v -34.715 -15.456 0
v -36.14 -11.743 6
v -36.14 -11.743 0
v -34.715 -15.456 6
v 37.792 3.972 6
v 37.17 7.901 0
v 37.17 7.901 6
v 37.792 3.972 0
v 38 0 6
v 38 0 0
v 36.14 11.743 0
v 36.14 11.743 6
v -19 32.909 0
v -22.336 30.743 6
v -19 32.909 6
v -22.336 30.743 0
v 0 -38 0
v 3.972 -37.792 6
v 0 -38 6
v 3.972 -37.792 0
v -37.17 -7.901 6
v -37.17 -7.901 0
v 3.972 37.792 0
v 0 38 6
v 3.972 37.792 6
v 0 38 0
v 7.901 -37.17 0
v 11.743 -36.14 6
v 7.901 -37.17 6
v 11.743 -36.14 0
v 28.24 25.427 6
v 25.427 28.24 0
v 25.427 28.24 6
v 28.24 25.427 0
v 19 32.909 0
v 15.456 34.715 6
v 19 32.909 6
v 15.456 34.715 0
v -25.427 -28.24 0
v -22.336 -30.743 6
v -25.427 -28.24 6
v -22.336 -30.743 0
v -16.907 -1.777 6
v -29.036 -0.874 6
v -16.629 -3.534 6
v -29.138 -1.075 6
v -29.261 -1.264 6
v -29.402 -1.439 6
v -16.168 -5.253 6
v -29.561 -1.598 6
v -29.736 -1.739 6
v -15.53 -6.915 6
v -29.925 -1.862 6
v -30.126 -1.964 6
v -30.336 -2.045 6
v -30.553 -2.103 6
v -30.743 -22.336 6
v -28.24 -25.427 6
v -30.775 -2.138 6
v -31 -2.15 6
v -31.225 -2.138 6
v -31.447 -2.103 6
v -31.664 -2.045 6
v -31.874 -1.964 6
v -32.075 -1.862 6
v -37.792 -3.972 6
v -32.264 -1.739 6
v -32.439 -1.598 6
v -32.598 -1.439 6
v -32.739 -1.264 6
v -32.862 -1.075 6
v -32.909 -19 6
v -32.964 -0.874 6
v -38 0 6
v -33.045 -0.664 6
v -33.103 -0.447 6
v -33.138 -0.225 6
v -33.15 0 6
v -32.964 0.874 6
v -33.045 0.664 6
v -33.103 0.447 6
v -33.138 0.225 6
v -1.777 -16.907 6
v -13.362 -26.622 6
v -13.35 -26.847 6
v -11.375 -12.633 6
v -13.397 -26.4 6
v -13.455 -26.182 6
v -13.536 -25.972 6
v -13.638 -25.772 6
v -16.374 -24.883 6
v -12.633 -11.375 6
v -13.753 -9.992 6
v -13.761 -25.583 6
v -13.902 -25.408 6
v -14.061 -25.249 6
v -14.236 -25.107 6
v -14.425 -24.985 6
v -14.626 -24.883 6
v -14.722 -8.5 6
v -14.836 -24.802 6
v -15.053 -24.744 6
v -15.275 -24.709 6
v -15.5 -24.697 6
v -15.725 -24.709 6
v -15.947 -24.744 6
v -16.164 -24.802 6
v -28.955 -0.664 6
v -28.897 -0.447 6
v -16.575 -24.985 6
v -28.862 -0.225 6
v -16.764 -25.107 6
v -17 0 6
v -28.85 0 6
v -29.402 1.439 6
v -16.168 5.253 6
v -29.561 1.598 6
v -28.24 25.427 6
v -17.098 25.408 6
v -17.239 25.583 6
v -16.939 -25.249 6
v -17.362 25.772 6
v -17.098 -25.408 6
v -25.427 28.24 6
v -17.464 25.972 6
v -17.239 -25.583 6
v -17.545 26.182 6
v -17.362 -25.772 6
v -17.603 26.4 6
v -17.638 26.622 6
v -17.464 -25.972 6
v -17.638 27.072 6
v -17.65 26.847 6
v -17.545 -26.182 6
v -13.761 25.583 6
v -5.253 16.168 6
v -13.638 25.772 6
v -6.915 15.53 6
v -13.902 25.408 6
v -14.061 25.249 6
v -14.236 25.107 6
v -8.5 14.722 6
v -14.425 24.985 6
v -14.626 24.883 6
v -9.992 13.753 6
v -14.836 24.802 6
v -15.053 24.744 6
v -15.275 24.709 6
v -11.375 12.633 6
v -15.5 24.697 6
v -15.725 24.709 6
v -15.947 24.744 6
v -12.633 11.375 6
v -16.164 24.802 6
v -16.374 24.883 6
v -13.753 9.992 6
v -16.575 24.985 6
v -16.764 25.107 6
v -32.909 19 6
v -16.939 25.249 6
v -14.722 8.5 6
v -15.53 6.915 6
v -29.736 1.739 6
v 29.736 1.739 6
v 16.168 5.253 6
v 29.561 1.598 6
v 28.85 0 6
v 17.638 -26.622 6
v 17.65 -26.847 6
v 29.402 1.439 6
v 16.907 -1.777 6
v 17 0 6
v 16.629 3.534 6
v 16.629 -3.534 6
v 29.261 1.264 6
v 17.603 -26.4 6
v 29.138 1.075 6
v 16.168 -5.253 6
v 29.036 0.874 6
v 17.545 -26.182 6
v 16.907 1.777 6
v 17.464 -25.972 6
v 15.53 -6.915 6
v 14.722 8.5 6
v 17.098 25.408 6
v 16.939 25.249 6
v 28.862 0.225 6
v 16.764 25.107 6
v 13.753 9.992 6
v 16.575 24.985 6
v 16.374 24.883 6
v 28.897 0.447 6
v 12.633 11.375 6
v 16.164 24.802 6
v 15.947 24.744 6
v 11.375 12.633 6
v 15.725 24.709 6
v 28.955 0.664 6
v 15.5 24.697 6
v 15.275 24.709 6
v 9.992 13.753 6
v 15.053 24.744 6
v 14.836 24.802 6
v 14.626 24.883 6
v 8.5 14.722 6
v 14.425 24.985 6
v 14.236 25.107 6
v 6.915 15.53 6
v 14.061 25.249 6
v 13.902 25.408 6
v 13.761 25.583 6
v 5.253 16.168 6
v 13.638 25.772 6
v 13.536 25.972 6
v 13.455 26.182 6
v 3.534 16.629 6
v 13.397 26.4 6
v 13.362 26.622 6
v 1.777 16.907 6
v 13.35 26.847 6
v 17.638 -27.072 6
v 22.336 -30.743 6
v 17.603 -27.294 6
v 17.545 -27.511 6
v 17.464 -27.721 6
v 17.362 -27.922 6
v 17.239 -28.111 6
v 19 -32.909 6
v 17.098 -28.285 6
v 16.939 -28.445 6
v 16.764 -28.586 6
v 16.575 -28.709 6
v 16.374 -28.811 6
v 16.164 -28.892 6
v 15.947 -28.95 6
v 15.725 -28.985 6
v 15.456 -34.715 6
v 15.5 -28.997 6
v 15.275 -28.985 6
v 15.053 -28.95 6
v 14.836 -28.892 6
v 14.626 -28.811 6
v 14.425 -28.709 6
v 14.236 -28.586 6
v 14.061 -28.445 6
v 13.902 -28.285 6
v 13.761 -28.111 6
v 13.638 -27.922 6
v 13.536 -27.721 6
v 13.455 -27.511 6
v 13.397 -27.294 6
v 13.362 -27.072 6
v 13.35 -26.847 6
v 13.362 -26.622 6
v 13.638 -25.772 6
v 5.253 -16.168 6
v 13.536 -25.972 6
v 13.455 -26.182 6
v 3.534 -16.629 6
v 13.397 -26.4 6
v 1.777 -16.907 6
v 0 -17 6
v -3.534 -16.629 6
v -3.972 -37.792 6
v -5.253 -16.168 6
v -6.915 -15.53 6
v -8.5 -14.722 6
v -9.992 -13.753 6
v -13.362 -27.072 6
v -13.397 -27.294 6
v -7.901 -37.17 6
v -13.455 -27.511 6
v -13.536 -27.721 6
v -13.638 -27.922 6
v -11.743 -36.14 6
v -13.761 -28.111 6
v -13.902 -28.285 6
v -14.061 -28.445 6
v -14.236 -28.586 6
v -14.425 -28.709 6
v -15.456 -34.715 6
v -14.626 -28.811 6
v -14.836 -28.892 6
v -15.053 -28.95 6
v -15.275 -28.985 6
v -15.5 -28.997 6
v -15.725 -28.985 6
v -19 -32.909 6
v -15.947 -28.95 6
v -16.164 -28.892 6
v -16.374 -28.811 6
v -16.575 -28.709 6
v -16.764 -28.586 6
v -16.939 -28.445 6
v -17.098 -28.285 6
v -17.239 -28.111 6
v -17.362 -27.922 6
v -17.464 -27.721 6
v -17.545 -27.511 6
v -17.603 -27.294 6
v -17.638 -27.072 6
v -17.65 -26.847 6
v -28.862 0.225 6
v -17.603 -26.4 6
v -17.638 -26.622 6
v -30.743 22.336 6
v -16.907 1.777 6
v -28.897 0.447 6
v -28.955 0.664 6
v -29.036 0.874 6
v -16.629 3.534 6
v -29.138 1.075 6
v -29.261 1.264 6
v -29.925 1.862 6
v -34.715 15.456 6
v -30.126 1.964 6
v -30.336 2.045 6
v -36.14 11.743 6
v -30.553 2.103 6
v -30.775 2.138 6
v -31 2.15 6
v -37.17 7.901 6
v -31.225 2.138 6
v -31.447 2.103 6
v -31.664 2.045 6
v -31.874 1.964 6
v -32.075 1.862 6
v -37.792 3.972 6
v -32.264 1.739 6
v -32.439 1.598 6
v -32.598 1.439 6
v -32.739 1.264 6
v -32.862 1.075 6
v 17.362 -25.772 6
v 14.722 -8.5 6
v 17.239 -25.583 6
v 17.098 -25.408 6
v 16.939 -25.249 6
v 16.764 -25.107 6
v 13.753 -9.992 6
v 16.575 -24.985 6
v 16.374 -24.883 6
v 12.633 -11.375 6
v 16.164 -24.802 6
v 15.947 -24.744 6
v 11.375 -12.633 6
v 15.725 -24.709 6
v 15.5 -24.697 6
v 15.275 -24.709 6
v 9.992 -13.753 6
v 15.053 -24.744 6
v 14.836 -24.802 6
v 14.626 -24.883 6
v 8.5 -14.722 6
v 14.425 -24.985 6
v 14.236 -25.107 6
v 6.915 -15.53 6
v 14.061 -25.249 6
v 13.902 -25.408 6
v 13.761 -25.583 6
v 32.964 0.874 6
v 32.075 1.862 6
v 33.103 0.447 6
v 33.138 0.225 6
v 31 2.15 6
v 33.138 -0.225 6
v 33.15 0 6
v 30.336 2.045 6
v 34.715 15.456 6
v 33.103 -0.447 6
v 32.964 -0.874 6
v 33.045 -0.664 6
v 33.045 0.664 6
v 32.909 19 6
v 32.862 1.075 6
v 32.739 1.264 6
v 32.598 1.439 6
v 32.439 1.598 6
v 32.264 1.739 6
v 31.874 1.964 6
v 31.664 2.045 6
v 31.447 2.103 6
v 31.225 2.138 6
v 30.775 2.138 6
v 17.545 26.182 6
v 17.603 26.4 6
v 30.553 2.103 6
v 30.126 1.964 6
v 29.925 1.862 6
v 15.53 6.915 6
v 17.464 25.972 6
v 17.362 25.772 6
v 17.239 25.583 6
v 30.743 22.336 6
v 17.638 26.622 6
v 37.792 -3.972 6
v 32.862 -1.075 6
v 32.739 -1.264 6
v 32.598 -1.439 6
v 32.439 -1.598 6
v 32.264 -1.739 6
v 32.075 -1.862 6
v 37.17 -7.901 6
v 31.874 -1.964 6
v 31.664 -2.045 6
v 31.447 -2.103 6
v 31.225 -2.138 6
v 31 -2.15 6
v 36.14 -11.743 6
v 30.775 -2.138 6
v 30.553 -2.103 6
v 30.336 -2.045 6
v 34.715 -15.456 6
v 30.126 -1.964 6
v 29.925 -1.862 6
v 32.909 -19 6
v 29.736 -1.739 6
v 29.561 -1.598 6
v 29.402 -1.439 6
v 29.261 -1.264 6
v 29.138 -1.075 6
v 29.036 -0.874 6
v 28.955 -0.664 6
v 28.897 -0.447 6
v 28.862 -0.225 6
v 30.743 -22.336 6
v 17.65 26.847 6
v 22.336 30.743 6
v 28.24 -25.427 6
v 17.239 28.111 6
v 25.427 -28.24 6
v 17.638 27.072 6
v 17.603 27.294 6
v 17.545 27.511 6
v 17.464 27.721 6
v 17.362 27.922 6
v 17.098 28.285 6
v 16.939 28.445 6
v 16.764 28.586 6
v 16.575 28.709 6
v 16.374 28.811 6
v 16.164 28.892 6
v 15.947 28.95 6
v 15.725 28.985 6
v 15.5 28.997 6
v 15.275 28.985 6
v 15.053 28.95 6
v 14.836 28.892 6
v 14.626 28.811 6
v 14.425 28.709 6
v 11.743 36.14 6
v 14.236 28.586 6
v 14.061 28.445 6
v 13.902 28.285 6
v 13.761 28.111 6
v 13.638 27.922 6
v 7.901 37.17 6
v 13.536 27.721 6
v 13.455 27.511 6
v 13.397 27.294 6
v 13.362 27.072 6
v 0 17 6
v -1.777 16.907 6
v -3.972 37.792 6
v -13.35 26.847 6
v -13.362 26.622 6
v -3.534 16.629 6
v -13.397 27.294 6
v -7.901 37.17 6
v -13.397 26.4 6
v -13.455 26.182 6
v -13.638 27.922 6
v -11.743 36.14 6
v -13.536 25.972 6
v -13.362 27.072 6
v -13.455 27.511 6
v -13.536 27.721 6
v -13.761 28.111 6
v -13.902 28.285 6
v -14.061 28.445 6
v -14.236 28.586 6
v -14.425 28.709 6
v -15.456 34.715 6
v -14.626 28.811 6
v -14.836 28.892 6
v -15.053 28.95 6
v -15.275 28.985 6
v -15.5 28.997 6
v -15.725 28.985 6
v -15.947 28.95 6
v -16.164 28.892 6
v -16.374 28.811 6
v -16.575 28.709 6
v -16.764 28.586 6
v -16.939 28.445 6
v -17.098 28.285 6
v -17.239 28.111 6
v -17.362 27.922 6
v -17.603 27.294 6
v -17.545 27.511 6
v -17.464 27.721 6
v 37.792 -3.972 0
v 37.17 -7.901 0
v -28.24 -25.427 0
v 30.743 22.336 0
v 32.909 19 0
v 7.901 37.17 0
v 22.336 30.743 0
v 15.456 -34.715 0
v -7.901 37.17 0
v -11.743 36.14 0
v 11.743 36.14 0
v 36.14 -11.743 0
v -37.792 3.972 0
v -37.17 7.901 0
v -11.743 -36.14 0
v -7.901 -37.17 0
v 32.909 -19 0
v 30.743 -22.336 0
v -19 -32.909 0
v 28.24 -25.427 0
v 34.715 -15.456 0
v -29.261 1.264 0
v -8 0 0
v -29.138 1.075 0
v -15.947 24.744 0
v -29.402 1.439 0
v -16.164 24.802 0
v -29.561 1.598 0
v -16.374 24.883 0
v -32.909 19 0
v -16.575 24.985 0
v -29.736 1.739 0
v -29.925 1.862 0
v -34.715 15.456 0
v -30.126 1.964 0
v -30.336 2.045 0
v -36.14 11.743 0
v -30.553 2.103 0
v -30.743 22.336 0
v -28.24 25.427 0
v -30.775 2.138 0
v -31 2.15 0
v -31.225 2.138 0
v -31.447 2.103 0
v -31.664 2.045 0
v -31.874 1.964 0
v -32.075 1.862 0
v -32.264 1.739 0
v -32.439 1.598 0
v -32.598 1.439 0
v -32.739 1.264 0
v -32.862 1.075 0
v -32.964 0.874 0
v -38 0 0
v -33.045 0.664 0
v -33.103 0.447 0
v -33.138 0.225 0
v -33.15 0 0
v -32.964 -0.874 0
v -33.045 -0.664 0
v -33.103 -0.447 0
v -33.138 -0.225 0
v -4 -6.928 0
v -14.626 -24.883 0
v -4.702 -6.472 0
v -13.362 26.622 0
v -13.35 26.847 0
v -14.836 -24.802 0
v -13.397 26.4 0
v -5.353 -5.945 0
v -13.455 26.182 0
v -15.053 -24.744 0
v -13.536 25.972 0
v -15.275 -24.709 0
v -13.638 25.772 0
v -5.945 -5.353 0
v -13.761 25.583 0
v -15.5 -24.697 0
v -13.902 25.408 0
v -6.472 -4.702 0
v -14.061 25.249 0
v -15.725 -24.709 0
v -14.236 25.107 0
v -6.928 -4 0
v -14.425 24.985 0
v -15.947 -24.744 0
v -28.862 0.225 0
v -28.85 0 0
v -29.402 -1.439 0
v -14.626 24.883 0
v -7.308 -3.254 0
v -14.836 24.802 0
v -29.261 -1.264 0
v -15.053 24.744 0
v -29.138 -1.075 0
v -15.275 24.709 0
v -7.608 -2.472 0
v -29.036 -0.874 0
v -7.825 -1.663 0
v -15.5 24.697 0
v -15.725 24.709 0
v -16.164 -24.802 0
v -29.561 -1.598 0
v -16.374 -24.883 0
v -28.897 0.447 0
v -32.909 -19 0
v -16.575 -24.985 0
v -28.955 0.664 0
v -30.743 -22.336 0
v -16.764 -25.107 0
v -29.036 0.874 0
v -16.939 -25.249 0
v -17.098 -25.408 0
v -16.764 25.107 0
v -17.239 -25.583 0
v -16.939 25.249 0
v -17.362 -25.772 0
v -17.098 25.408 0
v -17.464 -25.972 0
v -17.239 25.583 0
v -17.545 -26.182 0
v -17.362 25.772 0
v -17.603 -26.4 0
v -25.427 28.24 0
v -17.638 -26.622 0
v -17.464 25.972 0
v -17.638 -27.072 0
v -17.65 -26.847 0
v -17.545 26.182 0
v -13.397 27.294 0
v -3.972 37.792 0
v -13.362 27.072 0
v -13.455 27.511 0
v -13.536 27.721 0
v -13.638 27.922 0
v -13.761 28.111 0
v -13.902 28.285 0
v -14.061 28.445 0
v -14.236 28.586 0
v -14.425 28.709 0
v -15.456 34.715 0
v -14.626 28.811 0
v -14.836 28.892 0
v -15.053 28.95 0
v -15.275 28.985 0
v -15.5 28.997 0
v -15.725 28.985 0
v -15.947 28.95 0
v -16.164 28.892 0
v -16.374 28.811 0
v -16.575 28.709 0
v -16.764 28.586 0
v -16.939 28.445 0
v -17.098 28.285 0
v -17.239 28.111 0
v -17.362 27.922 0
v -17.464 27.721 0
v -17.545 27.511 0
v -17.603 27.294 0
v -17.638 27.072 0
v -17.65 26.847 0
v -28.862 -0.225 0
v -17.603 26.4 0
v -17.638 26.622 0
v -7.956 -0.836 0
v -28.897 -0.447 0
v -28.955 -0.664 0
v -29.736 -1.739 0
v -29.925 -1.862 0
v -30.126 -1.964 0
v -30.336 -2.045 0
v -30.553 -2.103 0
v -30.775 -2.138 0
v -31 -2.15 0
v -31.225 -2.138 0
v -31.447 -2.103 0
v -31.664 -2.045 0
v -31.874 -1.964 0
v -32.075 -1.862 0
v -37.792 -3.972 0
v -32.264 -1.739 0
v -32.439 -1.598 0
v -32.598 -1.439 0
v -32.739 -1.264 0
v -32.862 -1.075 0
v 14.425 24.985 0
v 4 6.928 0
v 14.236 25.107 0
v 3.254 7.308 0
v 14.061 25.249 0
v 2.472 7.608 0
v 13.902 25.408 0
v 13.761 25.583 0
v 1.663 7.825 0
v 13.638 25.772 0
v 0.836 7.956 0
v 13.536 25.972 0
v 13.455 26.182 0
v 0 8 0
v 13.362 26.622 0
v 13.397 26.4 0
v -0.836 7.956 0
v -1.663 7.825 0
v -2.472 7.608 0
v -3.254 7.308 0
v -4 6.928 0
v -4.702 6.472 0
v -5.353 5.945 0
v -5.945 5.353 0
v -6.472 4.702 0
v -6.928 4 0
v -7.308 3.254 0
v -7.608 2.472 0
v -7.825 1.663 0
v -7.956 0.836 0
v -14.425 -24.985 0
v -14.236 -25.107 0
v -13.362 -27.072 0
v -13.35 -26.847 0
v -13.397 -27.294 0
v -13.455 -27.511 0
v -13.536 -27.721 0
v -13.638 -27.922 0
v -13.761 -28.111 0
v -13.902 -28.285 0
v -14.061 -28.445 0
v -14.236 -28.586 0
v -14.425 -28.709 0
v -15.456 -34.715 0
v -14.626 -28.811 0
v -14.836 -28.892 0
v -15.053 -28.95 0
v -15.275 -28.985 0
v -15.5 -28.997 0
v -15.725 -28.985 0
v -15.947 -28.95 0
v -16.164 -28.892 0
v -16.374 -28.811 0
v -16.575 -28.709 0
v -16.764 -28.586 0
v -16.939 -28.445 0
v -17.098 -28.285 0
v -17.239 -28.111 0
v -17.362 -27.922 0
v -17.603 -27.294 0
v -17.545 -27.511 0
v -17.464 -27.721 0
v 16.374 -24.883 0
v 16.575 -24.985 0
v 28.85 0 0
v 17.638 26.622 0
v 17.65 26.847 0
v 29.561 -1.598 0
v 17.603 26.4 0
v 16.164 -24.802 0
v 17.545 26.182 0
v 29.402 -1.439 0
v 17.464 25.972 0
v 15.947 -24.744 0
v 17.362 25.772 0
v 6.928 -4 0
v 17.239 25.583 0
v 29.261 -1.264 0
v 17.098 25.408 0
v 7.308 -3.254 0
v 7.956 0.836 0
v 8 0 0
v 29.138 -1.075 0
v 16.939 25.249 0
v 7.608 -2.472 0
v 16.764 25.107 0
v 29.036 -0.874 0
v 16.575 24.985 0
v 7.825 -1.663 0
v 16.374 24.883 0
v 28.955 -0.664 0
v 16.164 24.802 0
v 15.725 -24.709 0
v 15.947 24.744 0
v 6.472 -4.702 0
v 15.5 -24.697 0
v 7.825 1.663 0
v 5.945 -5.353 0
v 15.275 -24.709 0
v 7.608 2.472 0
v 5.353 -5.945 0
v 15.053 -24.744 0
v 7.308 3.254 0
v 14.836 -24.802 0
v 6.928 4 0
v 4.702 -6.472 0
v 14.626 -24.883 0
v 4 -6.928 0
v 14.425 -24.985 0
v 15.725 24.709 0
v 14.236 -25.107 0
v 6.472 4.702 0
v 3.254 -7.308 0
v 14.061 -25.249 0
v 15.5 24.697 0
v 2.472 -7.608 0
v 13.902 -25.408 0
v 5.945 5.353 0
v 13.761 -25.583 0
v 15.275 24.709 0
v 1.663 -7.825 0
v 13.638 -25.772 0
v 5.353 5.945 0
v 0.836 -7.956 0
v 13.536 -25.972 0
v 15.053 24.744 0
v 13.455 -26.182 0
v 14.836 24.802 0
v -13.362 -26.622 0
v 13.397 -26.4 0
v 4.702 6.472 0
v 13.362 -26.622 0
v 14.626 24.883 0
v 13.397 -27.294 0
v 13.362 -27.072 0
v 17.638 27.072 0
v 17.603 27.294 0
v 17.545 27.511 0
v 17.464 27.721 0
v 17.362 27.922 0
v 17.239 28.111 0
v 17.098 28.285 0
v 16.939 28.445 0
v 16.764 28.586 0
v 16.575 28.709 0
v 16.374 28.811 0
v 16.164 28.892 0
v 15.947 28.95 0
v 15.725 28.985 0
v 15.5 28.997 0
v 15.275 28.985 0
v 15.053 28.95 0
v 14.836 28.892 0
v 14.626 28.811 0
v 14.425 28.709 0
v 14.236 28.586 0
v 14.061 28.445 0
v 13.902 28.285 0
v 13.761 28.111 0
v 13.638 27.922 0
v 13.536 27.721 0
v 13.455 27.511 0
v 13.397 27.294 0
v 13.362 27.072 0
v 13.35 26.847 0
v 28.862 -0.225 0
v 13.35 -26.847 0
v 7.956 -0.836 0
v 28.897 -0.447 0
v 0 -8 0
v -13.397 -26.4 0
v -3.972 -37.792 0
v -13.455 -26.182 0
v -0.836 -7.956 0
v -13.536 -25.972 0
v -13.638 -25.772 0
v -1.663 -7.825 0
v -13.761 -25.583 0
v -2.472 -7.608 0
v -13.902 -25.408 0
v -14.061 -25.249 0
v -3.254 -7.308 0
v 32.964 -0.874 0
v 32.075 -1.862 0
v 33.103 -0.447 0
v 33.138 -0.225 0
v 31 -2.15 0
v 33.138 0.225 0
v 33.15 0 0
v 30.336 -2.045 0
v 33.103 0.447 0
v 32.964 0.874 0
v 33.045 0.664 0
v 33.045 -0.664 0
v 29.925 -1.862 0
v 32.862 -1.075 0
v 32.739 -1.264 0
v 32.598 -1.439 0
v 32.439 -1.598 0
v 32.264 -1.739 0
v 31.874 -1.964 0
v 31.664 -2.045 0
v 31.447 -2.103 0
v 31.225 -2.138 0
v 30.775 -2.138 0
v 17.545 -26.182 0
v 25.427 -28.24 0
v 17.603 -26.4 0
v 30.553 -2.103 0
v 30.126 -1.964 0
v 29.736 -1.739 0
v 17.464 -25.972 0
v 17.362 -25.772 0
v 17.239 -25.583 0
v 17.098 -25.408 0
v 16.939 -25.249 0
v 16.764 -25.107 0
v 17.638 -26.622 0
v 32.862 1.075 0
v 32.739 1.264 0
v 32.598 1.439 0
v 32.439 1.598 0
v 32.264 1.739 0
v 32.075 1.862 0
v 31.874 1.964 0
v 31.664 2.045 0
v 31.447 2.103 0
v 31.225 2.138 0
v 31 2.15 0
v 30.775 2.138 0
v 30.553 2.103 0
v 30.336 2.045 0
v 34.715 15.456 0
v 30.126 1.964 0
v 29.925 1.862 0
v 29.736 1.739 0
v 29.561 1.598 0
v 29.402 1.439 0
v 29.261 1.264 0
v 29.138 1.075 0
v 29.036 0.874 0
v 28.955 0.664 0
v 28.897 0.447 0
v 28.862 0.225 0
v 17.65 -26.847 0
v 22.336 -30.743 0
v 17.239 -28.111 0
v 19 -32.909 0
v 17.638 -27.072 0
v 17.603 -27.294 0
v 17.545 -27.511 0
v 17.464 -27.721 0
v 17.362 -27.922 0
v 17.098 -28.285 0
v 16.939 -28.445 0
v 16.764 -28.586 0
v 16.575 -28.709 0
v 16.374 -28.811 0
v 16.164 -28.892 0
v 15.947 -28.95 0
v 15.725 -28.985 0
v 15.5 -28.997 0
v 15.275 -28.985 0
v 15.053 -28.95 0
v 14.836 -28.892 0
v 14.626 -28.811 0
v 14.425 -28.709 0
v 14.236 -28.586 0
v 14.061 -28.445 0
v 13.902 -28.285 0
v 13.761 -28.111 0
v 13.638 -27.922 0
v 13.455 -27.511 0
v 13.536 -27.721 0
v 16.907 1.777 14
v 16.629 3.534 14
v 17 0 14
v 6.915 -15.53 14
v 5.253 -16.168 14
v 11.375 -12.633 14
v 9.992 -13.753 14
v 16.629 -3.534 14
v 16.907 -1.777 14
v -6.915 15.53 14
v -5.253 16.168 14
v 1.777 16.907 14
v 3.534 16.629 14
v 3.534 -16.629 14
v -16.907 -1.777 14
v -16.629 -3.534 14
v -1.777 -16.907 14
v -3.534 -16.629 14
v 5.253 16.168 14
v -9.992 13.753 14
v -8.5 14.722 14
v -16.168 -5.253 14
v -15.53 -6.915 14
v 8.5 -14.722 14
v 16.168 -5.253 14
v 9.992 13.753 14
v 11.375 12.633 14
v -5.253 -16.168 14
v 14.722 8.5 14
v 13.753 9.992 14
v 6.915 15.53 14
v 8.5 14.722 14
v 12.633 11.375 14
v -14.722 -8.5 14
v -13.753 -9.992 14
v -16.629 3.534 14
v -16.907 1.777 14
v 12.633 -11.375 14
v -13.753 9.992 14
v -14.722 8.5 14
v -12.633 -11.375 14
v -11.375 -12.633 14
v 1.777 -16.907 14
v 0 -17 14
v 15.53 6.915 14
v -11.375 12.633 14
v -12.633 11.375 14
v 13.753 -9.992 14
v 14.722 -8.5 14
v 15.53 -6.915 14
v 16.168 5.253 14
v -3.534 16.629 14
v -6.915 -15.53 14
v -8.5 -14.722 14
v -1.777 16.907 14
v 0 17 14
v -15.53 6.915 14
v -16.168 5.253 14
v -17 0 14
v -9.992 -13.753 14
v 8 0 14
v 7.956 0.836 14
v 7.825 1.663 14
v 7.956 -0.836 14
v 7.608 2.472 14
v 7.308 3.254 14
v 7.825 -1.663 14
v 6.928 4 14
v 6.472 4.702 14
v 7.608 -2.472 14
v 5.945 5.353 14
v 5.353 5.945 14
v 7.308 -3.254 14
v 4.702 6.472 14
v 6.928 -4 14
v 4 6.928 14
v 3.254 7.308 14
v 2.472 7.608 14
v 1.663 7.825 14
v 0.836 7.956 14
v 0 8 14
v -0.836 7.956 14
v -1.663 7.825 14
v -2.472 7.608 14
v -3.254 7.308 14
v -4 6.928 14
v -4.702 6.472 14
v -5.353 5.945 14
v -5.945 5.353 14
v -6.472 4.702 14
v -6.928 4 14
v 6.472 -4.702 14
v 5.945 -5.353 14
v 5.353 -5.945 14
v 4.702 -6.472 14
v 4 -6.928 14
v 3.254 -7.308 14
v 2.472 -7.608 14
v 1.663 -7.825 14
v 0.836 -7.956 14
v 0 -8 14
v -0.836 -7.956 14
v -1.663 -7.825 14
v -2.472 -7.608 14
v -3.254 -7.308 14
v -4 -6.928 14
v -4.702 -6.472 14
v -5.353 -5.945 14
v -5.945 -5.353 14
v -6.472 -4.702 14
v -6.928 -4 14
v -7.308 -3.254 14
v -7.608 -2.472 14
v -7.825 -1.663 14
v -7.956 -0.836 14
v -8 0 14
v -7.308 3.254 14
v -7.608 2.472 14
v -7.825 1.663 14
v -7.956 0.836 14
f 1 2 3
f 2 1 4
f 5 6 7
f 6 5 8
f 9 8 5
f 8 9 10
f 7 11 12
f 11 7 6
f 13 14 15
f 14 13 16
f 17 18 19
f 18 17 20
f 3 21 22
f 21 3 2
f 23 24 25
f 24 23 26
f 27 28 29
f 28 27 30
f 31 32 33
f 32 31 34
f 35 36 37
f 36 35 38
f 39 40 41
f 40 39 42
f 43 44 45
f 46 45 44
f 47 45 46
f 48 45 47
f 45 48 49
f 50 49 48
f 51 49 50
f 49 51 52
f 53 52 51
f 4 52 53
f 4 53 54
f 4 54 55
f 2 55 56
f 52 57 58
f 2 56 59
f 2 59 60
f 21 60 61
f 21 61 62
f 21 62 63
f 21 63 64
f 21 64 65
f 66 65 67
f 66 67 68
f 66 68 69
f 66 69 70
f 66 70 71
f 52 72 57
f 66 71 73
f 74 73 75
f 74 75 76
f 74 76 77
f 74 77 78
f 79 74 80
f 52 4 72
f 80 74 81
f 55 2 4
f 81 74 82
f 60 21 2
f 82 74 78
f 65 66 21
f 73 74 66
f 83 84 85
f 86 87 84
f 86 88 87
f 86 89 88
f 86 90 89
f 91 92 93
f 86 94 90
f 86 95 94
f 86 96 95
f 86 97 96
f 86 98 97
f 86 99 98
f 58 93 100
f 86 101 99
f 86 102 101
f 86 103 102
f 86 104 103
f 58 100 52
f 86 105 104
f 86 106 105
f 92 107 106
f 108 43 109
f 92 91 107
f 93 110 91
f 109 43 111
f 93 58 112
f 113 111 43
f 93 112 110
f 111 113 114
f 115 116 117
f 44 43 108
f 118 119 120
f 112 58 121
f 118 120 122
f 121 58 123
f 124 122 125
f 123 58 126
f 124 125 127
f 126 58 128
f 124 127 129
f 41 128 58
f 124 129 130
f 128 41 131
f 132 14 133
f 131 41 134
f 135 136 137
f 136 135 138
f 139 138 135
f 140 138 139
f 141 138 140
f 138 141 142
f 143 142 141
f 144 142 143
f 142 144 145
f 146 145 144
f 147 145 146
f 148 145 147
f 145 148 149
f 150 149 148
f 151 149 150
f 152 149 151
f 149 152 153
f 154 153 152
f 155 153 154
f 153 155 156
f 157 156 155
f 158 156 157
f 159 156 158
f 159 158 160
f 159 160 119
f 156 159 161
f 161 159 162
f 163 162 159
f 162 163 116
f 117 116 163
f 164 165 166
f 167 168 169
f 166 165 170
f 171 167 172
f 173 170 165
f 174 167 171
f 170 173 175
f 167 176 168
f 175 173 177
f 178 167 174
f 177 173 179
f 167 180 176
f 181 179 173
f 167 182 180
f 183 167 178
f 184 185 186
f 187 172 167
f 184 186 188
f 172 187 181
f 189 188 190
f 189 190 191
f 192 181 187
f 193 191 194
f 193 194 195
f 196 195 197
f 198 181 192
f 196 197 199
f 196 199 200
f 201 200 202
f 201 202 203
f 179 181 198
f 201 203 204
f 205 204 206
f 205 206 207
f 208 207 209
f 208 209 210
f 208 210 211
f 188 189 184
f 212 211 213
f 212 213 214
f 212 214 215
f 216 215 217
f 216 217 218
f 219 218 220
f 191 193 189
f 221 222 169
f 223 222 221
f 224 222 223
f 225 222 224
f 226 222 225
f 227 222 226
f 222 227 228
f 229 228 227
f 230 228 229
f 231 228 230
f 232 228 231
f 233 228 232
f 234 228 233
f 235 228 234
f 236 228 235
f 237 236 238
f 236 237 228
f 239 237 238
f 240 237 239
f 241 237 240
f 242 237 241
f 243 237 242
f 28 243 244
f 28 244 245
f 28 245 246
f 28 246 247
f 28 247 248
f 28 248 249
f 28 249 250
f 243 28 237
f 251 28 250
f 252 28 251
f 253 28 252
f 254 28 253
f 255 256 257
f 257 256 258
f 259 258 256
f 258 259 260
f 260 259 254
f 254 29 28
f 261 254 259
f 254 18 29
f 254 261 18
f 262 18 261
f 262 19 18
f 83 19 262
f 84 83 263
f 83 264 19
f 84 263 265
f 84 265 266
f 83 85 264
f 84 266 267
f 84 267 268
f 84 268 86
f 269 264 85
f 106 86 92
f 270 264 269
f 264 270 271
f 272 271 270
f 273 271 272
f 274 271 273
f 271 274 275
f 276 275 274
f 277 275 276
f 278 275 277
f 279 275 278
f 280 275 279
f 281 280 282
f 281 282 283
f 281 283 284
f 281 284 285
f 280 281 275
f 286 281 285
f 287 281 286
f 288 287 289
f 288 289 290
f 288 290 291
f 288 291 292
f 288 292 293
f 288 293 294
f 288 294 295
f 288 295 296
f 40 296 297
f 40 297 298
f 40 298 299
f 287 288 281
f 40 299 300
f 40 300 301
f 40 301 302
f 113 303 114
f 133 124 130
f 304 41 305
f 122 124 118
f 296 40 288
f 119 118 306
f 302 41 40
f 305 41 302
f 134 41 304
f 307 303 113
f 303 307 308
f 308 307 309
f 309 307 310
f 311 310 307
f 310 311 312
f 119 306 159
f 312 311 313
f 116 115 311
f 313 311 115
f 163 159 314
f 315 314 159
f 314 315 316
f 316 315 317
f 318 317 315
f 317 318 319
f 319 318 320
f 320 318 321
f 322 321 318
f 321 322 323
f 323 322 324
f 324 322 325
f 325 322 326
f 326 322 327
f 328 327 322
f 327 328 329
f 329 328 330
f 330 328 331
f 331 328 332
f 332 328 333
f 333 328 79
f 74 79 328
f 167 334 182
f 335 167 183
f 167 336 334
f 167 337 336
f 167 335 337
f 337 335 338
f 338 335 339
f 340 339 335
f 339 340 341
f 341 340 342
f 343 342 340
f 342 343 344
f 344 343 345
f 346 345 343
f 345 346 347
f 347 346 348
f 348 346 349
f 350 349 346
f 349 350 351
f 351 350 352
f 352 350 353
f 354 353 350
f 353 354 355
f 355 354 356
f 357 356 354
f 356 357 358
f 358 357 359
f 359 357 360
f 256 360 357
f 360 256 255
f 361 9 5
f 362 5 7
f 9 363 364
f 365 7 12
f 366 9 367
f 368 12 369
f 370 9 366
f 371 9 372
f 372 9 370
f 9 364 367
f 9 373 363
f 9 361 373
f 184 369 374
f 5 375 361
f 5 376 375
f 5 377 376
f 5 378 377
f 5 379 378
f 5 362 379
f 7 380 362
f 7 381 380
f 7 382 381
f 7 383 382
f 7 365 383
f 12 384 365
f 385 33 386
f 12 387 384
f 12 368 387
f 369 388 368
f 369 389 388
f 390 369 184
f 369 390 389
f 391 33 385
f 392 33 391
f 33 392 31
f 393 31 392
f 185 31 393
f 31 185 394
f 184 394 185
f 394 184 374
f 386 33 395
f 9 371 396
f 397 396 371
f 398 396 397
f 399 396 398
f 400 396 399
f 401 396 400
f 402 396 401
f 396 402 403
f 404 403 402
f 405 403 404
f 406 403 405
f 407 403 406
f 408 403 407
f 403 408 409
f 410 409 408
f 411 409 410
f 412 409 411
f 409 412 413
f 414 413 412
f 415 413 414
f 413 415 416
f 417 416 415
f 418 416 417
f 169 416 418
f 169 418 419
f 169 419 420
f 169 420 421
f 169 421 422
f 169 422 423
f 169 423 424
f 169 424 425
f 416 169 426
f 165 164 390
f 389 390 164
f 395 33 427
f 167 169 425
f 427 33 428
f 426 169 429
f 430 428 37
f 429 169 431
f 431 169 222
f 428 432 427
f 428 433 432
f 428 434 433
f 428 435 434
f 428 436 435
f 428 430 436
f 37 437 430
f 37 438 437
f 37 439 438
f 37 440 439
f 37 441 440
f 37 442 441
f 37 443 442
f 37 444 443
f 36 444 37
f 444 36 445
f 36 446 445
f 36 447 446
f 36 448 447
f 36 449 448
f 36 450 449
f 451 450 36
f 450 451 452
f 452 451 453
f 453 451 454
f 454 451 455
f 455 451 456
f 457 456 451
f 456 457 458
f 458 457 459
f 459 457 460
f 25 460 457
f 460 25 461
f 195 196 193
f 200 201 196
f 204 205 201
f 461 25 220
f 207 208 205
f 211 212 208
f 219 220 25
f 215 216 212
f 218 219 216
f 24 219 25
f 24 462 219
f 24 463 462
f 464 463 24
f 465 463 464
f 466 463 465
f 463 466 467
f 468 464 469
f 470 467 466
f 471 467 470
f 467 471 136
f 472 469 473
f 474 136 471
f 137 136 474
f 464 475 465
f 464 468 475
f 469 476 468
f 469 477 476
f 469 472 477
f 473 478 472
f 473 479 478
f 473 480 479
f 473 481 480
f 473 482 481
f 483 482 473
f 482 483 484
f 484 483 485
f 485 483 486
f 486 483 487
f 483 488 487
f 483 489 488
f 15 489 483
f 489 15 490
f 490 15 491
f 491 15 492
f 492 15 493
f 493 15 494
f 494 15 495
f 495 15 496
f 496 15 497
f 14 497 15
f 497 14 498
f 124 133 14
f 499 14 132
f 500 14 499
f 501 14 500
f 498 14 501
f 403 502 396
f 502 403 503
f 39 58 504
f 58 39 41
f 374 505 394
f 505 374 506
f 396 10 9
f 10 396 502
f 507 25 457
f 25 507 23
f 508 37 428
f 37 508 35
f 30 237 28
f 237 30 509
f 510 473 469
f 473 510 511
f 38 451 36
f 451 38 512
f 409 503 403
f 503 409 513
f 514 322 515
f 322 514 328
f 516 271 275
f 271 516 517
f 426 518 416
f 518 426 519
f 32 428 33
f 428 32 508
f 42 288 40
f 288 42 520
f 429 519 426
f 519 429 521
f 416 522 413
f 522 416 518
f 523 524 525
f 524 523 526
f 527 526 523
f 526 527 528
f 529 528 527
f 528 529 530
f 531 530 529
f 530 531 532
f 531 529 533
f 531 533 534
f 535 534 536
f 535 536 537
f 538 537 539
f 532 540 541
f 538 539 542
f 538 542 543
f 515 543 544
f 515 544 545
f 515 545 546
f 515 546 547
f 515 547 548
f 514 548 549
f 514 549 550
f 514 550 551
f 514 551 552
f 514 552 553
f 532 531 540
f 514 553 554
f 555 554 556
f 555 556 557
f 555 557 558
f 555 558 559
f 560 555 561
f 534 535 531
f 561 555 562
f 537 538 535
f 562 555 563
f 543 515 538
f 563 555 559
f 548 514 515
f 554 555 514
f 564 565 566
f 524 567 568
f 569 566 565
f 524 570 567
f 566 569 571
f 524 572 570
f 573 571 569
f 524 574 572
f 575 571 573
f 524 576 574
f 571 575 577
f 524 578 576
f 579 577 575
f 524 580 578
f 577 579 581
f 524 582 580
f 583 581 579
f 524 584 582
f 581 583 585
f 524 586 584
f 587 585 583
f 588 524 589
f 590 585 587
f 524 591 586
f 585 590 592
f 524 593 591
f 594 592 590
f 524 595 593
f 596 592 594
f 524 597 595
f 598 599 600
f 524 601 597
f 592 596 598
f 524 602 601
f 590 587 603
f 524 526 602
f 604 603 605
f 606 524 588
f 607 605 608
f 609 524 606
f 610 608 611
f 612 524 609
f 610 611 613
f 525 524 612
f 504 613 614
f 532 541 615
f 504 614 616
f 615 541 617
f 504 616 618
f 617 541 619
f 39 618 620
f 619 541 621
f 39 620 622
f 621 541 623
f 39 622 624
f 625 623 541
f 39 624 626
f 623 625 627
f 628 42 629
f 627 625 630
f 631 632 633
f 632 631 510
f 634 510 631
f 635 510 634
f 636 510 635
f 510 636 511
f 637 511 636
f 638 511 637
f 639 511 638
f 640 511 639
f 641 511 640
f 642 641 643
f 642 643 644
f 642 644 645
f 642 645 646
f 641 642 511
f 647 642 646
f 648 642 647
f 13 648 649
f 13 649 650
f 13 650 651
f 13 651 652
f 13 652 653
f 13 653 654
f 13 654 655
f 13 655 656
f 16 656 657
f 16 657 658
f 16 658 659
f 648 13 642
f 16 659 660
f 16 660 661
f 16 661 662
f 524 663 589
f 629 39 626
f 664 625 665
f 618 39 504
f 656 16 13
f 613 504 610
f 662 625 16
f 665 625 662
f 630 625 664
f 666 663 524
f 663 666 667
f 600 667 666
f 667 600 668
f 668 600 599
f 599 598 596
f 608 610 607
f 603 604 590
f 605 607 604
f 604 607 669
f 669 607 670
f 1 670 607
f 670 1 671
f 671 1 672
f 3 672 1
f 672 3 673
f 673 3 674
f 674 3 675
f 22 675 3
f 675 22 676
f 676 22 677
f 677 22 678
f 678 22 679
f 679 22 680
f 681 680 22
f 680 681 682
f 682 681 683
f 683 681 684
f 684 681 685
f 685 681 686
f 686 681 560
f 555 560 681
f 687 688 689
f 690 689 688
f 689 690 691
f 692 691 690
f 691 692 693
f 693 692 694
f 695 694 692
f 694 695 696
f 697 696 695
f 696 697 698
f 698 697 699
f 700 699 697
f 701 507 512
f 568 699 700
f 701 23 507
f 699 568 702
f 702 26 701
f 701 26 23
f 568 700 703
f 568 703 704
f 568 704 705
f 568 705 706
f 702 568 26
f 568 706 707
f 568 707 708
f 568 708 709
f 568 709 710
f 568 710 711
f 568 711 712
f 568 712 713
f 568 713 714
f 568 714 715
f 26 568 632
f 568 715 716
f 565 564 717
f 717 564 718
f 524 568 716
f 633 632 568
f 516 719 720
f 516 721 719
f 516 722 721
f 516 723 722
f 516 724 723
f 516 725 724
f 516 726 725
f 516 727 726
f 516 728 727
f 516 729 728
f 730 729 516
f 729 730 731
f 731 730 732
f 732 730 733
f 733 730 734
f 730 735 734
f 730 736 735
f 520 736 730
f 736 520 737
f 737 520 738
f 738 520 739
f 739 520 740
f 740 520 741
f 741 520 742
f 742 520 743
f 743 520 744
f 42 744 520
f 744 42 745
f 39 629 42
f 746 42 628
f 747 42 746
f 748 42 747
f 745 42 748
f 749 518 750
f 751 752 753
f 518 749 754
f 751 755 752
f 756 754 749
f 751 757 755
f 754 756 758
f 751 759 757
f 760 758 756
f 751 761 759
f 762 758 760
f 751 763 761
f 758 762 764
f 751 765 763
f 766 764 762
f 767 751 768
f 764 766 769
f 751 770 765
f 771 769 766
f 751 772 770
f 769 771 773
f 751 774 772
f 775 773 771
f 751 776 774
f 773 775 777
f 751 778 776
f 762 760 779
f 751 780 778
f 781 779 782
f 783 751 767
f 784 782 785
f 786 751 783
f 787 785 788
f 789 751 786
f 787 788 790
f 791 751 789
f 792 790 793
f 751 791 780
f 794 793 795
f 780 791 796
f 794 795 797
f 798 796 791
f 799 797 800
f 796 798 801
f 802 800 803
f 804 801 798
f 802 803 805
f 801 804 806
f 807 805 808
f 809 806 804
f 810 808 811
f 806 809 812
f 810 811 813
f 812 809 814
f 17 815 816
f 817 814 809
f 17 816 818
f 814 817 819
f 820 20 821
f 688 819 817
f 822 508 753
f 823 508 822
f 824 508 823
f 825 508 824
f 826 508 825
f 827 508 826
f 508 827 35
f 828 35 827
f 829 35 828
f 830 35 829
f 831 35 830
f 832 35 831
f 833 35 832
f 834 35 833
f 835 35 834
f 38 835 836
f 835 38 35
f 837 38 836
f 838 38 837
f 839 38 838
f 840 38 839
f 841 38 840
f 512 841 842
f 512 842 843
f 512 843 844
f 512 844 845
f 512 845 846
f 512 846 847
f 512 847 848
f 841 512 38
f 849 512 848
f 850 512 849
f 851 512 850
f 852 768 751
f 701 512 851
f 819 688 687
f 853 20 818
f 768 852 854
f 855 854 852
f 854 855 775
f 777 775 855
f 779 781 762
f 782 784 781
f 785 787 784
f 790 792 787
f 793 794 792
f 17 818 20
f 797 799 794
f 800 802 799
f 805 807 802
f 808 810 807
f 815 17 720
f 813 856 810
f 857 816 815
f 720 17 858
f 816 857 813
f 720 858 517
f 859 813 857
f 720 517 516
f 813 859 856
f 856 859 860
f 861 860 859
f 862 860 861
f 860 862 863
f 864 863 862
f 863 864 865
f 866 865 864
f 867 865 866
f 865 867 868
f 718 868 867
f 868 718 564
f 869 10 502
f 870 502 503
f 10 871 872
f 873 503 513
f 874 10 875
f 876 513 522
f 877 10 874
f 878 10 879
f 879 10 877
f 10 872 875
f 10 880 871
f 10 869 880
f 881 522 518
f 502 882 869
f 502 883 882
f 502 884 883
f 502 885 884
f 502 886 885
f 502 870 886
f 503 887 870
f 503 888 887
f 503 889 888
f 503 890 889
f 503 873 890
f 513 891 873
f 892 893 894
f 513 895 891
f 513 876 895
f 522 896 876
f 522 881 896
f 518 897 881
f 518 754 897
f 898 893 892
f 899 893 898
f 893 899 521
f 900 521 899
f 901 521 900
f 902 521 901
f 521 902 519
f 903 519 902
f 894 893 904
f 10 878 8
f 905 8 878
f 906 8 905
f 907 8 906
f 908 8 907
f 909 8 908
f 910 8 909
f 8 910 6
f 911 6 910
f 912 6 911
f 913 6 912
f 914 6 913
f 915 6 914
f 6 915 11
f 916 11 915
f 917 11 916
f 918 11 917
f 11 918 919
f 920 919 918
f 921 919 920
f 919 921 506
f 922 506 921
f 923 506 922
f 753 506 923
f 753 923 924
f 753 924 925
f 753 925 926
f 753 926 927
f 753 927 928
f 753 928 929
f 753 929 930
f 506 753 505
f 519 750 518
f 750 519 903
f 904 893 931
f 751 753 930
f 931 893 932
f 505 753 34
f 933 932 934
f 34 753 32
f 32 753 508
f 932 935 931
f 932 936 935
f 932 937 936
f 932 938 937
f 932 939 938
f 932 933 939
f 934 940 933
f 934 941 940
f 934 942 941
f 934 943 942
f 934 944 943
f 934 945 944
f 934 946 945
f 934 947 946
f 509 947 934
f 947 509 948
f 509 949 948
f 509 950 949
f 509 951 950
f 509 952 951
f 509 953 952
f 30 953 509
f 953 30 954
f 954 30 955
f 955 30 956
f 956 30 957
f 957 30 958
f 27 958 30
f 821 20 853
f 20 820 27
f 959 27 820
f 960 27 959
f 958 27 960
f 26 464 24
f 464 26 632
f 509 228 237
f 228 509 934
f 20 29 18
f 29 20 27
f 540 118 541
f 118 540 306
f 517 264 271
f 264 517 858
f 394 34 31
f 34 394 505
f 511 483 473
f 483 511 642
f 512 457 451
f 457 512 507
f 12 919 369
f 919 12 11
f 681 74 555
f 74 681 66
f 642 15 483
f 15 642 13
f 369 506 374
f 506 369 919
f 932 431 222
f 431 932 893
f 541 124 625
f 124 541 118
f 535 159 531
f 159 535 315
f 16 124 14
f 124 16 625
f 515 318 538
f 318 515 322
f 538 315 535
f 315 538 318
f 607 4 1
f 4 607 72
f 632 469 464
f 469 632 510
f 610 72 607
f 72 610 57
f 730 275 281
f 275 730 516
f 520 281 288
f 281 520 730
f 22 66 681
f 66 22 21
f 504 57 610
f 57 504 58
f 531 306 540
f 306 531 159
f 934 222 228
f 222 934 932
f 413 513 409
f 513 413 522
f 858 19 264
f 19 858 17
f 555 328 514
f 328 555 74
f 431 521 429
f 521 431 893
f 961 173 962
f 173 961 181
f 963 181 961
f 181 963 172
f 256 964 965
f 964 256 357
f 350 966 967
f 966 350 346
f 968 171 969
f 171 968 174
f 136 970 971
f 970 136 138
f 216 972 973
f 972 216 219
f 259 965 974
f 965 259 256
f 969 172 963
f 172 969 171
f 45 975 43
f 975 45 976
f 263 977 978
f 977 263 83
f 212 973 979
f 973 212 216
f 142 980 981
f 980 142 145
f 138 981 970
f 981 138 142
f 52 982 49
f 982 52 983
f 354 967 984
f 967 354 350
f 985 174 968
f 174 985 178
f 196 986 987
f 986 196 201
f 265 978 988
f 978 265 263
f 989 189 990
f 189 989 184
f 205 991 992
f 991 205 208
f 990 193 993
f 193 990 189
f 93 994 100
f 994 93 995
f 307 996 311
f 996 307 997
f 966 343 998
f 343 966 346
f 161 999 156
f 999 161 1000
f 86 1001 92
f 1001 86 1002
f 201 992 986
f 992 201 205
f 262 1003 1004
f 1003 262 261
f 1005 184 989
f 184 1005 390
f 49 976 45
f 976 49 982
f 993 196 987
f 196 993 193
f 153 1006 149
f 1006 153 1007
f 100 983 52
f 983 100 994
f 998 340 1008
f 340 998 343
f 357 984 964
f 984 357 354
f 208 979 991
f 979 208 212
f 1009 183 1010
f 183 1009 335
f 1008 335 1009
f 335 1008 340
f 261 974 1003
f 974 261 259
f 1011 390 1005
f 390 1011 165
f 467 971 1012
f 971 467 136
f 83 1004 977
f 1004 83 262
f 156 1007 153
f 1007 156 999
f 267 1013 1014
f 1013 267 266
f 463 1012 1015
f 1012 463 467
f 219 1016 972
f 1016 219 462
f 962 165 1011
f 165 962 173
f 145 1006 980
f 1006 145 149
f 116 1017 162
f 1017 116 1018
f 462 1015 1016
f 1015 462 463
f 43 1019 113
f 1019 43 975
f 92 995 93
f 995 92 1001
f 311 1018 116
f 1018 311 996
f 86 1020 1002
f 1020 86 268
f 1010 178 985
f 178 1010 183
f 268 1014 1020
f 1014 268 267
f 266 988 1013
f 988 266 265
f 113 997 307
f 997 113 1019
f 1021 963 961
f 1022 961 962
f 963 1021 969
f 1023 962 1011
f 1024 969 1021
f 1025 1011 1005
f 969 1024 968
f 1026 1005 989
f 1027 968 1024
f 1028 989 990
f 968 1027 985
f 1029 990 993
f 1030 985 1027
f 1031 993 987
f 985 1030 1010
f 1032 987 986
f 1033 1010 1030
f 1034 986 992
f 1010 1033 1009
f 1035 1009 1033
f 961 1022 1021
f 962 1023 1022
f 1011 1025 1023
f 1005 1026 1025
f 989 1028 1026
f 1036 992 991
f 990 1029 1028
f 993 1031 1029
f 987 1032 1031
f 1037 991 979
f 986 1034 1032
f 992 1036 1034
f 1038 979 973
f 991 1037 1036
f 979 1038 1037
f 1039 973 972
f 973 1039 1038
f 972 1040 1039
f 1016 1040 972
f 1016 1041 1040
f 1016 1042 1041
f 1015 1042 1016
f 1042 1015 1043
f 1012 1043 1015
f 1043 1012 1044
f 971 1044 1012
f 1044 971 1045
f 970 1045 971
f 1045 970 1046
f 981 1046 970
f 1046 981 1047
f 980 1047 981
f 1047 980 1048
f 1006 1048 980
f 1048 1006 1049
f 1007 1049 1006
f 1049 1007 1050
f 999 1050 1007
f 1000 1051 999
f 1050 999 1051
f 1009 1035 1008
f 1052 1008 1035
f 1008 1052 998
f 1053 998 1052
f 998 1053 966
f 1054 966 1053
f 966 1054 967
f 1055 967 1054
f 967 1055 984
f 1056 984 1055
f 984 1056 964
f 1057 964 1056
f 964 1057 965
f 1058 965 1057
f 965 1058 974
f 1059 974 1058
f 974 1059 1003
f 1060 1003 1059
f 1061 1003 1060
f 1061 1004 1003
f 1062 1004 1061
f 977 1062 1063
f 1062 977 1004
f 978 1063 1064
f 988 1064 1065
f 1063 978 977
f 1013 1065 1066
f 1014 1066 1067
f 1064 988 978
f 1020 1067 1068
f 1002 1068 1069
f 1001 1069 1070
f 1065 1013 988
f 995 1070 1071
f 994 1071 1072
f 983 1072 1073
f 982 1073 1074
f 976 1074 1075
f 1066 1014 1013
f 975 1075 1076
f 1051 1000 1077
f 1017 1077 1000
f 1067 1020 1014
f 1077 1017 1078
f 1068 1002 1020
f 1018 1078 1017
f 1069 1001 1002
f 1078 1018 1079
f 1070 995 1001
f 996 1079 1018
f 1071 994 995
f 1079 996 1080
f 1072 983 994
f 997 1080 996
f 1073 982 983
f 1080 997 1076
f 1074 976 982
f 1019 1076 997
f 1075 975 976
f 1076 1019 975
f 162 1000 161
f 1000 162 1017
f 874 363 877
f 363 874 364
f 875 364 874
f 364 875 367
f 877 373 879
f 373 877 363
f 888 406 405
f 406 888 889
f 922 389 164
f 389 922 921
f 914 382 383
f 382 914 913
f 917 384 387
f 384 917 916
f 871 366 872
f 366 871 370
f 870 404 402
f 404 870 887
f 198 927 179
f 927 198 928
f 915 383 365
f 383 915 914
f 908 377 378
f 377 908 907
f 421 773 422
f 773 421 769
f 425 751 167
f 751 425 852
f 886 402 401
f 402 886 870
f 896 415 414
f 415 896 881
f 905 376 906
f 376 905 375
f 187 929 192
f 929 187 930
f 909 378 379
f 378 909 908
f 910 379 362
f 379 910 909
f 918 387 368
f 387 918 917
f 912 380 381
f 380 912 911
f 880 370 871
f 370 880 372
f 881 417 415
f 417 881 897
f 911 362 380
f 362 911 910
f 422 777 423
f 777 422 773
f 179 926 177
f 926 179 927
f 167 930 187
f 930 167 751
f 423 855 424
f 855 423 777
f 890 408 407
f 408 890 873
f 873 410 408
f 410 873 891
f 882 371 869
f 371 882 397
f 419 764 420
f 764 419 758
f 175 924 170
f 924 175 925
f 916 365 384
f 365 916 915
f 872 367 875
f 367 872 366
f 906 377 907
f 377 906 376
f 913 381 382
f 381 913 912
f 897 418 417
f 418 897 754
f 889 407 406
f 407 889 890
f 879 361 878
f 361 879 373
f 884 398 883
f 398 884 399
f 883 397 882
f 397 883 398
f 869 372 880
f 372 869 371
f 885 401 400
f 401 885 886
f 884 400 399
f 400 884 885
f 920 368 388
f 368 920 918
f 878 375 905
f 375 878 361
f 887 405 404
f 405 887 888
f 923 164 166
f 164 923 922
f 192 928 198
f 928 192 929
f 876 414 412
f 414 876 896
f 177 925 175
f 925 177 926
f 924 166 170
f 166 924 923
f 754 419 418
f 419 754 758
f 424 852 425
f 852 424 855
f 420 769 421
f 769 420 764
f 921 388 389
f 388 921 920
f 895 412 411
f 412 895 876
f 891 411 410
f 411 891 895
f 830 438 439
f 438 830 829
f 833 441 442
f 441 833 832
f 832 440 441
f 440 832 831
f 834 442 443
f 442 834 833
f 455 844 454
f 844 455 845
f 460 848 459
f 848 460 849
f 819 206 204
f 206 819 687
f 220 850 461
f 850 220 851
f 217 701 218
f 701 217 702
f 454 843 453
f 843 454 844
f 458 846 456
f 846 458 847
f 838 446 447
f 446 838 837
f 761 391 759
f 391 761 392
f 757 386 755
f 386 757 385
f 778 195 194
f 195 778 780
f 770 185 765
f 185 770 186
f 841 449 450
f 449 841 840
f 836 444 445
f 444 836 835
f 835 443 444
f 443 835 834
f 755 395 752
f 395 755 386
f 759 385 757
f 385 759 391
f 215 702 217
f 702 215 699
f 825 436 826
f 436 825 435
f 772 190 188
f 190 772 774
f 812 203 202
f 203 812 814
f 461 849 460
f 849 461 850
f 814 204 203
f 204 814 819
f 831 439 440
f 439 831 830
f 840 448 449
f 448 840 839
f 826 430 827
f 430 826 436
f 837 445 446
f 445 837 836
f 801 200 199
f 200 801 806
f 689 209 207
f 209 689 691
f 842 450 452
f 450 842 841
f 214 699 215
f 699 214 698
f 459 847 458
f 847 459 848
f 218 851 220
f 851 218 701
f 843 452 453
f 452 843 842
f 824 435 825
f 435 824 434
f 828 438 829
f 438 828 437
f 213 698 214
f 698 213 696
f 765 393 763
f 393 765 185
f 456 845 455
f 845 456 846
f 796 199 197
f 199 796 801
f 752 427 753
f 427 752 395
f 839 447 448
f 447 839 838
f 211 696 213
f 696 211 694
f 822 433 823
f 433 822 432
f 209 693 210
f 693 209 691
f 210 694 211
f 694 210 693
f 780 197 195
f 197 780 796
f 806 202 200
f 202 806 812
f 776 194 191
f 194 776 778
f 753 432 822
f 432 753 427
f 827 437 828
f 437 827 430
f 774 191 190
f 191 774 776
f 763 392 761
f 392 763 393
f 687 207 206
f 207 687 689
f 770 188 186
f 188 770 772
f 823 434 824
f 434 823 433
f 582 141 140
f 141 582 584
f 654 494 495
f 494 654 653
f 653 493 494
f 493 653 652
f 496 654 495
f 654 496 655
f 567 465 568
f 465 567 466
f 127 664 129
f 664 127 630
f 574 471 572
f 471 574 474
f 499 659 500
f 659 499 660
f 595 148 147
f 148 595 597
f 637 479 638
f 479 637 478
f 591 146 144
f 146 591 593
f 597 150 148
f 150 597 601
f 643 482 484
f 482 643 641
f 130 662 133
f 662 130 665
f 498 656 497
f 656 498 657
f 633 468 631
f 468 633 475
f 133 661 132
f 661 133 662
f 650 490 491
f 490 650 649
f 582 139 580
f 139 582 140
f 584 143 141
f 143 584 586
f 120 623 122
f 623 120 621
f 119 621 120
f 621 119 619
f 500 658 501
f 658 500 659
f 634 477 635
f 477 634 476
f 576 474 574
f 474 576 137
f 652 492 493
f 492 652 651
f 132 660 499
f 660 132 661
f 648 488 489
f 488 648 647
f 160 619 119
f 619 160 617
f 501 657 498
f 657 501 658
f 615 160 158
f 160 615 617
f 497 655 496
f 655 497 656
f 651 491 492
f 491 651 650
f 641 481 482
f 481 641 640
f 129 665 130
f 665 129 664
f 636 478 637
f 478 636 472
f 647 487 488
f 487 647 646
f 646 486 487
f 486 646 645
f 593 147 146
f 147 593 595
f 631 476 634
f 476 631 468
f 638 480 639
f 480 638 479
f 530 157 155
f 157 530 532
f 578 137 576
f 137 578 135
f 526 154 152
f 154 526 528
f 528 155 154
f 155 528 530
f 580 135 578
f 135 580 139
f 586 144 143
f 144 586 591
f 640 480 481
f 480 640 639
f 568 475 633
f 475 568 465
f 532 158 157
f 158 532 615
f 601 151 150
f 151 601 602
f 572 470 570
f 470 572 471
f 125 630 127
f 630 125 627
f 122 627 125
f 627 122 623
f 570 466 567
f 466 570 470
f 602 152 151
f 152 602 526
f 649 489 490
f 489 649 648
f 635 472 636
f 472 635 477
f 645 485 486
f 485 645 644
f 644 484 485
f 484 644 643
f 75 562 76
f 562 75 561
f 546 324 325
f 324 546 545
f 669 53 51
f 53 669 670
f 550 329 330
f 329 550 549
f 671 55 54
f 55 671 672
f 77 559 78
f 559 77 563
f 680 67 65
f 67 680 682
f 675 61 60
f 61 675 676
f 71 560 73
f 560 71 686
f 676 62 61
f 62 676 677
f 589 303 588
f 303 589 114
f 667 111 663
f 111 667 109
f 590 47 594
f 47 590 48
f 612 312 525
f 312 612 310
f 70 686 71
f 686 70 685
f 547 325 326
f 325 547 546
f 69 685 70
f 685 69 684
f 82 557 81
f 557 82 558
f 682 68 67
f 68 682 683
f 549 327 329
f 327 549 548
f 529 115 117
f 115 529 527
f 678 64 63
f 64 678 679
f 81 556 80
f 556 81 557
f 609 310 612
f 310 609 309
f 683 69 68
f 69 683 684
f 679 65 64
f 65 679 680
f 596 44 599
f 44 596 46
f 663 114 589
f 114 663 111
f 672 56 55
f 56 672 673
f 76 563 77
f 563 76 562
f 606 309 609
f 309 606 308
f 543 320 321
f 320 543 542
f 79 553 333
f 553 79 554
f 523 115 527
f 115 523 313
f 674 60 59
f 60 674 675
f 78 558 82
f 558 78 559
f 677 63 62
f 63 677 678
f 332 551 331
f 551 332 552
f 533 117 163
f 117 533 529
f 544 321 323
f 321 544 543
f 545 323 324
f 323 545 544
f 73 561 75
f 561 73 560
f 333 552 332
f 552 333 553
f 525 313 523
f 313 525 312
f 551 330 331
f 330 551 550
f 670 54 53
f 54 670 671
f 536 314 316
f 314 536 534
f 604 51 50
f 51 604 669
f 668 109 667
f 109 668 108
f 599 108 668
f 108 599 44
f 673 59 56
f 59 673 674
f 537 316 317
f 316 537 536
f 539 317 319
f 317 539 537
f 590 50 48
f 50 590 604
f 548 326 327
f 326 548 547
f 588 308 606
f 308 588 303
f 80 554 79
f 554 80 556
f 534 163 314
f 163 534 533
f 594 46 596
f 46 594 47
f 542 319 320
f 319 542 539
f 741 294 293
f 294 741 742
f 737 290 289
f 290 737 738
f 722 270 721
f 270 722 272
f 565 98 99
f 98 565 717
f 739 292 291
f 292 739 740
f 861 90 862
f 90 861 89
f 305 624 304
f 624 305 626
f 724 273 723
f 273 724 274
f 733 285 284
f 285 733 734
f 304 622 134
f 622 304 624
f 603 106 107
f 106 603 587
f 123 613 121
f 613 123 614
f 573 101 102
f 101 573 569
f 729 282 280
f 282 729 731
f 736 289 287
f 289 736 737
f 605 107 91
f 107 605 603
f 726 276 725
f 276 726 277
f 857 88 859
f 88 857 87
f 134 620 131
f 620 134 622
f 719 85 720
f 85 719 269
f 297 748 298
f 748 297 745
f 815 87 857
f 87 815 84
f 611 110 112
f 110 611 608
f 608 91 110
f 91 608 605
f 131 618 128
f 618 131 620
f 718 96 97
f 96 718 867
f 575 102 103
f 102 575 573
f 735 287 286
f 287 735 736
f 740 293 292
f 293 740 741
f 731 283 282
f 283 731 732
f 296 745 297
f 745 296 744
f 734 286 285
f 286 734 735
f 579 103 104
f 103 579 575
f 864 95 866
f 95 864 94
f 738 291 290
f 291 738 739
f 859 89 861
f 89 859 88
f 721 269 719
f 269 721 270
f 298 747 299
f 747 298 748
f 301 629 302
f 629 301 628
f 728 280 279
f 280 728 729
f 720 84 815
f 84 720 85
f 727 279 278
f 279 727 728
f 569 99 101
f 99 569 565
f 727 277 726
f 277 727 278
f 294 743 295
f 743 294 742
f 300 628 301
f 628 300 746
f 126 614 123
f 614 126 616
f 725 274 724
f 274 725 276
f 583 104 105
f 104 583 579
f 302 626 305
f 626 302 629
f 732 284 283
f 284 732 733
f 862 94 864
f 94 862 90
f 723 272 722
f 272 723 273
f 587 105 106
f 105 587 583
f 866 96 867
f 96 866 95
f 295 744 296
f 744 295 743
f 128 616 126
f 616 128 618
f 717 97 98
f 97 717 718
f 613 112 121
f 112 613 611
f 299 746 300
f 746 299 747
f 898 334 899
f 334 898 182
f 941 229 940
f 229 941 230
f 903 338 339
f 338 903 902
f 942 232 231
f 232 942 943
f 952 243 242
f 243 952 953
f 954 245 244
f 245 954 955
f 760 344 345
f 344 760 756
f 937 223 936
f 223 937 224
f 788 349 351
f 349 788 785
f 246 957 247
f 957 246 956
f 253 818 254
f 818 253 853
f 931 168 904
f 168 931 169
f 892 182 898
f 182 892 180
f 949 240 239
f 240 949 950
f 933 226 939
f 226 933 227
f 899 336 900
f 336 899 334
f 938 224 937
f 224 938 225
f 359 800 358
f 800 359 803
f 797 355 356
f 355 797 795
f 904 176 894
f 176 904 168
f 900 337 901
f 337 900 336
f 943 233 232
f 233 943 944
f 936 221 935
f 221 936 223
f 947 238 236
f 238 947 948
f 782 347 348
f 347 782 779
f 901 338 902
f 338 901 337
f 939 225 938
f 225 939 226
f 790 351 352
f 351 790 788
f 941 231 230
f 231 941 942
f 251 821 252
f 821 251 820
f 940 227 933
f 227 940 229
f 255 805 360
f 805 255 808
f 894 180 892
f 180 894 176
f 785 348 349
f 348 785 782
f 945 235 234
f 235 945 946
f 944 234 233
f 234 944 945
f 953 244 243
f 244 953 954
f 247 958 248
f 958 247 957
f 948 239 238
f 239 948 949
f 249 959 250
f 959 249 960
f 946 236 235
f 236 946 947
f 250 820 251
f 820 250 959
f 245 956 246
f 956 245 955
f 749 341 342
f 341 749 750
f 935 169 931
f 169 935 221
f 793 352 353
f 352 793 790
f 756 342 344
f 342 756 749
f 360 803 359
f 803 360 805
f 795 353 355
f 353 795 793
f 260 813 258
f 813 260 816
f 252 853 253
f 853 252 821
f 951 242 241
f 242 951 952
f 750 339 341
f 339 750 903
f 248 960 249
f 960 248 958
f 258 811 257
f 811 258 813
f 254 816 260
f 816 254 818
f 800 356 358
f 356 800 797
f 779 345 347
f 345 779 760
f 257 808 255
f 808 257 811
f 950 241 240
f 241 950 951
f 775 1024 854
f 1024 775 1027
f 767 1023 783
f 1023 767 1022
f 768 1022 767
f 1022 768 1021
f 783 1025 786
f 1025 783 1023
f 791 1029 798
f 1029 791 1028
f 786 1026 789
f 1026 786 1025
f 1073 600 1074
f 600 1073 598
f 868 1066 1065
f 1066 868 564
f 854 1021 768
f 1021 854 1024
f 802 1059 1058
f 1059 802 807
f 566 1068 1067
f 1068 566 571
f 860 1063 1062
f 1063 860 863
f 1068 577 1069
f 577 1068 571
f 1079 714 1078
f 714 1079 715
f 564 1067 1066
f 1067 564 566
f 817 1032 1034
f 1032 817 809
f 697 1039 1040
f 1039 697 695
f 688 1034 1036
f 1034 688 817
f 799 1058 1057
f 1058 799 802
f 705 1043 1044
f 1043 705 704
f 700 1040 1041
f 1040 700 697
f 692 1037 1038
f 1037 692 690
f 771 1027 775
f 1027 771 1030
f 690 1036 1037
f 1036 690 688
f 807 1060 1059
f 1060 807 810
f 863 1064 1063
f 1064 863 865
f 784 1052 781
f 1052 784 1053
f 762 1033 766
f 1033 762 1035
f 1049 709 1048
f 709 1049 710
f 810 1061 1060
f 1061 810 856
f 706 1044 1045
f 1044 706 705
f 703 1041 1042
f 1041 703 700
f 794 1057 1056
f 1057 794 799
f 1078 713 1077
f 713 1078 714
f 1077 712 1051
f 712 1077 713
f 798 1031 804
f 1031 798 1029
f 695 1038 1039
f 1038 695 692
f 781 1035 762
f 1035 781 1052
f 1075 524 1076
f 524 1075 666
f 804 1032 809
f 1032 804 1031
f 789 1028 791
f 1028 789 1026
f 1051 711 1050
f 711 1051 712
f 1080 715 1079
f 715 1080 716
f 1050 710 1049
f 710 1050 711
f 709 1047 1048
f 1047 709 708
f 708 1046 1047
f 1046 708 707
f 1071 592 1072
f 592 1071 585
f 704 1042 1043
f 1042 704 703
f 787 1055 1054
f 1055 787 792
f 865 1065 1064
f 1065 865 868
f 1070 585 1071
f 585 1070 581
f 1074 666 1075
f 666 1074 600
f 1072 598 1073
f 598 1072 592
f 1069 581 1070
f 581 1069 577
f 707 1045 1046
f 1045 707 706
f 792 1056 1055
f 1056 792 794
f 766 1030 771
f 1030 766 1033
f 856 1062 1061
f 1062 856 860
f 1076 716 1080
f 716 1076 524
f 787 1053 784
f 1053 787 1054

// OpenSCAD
// 6-bolt mounting flange, 76 mm OD.
$fn = 60;
eps = 0.02;
flange_d = 76;
flange_t = 6;
hub_d = 34;
hub_h = 14;
center_d = 16;
bolt_circle_d = 62;
bolt_d = 4.3;
difference() {
    union() { cylinder(d = flange_d, h = flange_t); cylinder(d = hub_d, h = hub_h); }
    translate([0, 0, -eps]) cylinder(d = center_d, h = hub_h + 2 * eps);
    for (i = [0 : 5]) rotate([0, 0, i * 360 / 6])
        translate([bolt_circle_d / 2, 0, -eps]) cylinder(d = bolt_d, h = flange_t + 2 * eps);
}
